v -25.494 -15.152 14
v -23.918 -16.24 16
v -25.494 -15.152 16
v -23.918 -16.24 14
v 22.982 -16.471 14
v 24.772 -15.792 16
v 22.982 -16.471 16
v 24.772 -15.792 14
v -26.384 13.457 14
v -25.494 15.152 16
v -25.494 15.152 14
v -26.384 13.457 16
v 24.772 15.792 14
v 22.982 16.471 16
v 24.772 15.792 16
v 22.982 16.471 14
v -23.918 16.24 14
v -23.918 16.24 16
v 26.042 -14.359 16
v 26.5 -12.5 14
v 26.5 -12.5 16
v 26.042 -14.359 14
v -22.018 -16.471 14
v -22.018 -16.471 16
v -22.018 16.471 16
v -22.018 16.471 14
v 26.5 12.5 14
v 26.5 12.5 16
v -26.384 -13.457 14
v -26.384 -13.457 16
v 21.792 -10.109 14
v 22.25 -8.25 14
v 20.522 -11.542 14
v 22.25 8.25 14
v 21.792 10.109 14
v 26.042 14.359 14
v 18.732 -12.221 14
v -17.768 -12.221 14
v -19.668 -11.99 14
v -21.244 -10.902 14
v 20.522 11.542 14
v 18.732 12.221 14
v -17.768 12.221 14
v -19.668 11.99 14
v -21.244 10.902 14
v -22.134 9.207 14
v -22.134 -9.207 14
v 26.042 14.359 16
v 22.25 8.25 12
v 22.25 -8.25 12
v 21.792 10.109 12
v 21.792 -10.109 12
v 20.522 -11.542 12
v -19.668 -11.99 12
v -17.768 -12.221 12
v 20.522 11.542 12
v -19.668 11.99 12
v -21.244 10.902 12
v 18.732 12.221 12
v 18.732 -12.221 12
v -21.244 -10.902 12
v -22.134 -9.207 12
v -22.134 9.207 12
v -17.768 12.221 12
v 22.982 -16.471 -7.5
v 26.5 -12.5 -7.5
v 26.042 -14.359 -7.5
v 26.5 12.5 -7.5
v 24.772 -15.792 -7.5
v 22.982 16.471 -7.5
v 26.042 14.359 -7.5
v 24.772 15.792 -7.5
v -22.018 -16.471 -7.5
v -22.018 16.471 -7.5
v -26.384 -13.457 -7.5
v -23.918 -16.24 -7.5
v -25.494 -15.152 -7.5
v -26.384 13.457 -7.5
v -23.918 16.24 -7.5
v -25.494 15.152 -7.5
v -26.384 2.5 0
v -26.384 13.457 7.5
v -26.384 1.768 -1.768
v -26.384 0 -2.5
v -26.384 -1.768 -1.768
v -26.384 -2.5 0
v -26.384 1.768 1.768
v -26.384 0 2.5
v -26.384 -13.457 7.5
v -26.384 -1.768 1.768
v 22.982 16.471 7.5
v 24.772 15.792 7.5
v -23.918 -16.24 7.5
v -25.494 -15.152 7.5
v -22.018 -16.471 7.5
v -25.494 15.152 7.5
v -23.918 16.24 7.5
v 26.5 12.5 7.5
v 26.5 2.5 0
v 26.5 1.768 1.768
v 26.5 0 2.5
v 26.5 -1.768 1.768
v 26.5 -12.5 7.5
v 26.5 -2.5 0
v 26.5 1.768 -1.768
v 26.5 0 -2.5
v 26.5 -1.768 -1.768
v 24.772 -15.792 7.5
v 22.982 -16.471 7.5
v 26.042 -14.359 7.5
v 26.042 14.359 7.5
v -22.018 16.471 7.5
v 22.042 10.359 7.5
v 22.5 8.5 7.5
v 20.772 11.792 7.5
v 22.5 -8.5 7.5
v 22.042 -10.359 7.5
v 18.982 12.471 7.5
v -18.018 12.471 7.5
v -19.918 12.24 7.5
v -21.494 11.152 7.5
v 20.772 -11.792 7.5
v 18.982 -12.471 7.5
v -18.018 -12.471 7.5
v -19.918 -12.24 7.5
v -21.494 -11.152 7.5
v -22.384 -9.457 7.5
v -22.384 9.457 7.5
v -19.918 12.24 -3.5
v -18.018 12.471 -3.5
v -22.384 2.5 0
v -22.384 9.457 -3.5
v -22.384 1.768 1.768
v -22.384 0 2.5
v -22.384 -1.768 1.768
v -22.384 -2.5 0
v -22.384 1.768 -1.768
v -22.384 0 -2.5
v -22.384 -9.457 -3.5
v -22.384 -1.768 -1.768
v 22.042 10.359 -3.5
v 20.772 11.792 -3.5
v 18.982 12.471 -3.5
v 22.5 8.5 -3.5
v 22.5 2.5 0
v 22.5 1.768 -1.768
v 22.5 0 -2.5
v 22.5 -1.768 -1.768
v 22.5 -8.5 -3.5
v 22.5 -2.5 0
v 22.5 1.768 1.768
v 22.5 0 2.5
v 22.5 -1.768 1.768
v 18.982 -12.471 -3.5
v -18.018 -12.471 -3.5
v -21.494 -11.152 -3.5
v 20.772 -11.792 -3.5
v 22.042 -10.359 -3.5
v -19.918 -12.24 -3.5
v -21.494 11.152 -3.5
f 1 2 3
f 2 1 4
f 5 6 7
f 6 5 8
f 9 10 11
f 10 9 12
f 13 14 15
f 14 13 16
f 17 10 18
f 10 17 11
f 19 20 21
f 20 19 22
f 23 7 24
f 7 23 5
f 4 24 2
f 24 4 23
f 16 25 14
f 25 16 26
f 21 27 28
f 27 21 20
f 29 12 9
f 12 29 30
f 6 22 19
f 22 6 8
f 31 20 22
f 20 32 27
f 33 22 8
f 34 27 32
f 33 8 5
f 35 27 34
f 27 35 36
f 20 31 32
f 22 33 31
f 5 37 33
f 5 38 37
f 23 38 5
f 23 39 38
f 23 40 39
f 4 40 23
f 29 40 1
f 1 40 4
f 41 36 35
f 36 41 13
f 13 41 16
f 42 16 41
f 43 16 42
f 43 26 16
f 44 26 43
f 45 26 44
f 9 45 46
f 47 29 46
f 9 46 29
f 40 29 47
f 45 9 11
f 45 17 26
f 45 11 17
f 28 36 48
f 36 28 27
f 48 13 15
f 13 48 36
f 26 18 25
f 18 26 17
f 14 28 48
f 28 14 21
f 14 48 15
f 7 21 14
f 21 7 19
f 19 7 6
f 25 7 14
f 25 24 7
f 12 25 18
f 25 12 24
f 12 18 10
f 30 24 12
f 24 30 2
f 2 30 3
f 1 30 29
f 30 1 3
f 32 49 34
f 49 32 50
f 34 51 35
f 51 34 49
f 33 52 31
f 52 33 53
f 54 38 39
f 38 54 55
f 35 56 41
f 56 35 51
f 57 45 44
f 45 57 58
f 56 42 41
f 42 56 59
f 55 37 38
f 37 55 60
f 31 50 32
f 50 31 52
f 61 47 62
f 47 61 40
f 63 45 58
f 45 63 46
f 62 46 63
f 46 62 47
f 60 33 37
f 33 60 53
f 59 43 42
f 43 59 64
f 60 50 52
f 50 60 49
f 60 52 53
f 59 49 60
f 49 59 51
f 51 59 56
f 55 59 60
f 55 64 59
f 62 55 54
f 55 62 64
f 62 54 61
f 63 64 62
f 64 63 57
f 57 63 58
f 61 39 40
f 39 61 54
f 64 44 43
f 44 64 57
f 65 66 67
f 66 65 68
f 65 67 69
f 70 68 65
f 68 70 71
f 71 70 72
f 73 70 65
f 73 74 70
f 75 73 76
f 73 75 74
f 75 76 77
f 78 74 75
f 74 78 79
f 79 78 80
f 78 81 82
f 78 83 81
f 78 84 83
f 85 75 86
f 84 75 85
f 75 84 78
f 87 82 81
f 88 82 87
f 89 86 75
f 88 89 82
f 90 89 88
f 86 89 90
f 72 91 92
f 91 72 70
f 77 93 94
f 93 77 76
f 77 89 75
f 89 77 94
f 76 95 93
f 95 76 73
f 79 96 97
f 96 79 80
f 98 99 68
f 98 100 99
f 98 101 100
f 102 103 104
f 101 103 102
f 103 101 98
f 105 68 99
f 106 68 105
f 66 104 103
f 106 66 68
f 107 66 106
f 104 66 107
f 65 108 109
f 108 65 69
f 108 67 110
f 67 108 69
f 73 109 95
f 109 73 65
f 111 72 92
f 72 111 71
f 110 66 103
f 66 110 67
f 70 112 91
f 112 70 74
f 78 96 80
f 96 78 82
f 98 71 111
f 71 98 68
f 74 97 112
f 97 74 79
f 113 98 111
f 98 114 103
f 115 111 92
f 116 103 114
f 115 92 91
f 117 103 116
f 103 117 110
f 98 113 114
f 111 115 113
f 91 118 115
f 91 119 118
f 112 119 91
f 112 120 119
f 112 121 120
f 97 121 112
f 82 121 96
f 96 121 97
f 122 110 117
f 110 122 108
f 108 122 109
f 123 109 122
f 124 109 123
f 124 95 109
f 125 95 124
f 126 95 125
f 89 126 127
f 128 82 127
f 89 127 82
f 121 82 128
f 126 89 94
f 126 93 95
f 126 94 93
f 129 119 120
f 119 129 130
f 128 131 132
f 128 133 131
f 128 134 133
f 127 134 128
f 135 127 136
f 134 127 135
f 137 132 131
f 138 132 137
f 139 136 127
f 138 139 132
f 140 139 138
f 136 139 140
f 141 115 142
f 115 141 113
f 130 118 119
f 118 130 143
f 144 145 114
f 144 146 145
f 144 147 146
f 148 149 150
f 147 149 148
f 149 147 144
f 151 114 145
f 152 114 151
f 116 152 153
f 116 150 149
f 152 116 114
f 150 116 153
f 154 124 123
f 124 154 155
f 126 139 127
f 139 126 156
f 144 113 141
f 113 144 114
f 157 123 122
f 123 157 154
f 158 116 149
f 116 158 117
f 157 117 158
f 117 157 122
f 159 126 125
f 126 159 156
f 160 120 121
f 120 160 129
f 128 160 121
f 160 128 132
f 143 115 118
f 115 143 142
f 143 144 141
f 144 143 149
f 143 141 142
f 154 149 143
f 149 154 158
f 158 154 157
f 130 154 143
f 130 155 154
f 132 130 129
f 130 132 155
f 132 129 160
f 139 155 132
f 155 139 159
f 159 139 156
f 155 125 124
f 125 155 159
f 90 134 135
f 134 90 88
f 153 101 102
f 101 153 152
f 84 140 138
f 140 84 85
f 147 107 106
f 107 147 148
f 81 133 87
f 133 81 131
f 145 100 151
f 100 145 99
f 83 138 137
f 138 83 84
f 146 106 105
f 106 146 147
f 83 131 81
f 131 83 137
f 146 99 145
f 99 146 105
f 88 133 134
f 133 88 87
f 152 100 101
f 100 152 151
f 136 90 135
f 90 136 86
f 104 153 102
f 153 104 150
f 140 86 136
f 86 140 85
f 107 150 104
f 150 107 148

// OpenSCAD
module cover(){

    difference(){
    cube([40,25,4],center=true);
    cube([20,13,10], center=true);
    }

}

px=45;
py=25;
pz=15;


//cylinder(h=30,r=4,center=true);

module box(bx,by,bz){

    hull(){
        for ( x = [-bx/2:bx:bx/2]){
            for ( y = [-by/2:by:by/2]){

            translate([x, y, 0]) cylinder(h=bz,r=4,center=true);
            }
           }
       }    
    
   }
 
 w=4;
  
 module body(){ 
     difference(){
        box(px,py,pz);
        color("blue") translate([0,0,w]) box(px-2*w,py-2*w,pz);
     }
 }     
 
 module cover(){
 
 translate([0,0,pz]) box(px,py,2);
 translate([0,0,pz-2]) box(px-2*w-0.5,py-2*w-0.5,2);
 
 }
 
 cover();
 
 difference(){
 body();
 rotate([0,90,0]) cylinder(h=200,r=2.5,center=true);
 }
